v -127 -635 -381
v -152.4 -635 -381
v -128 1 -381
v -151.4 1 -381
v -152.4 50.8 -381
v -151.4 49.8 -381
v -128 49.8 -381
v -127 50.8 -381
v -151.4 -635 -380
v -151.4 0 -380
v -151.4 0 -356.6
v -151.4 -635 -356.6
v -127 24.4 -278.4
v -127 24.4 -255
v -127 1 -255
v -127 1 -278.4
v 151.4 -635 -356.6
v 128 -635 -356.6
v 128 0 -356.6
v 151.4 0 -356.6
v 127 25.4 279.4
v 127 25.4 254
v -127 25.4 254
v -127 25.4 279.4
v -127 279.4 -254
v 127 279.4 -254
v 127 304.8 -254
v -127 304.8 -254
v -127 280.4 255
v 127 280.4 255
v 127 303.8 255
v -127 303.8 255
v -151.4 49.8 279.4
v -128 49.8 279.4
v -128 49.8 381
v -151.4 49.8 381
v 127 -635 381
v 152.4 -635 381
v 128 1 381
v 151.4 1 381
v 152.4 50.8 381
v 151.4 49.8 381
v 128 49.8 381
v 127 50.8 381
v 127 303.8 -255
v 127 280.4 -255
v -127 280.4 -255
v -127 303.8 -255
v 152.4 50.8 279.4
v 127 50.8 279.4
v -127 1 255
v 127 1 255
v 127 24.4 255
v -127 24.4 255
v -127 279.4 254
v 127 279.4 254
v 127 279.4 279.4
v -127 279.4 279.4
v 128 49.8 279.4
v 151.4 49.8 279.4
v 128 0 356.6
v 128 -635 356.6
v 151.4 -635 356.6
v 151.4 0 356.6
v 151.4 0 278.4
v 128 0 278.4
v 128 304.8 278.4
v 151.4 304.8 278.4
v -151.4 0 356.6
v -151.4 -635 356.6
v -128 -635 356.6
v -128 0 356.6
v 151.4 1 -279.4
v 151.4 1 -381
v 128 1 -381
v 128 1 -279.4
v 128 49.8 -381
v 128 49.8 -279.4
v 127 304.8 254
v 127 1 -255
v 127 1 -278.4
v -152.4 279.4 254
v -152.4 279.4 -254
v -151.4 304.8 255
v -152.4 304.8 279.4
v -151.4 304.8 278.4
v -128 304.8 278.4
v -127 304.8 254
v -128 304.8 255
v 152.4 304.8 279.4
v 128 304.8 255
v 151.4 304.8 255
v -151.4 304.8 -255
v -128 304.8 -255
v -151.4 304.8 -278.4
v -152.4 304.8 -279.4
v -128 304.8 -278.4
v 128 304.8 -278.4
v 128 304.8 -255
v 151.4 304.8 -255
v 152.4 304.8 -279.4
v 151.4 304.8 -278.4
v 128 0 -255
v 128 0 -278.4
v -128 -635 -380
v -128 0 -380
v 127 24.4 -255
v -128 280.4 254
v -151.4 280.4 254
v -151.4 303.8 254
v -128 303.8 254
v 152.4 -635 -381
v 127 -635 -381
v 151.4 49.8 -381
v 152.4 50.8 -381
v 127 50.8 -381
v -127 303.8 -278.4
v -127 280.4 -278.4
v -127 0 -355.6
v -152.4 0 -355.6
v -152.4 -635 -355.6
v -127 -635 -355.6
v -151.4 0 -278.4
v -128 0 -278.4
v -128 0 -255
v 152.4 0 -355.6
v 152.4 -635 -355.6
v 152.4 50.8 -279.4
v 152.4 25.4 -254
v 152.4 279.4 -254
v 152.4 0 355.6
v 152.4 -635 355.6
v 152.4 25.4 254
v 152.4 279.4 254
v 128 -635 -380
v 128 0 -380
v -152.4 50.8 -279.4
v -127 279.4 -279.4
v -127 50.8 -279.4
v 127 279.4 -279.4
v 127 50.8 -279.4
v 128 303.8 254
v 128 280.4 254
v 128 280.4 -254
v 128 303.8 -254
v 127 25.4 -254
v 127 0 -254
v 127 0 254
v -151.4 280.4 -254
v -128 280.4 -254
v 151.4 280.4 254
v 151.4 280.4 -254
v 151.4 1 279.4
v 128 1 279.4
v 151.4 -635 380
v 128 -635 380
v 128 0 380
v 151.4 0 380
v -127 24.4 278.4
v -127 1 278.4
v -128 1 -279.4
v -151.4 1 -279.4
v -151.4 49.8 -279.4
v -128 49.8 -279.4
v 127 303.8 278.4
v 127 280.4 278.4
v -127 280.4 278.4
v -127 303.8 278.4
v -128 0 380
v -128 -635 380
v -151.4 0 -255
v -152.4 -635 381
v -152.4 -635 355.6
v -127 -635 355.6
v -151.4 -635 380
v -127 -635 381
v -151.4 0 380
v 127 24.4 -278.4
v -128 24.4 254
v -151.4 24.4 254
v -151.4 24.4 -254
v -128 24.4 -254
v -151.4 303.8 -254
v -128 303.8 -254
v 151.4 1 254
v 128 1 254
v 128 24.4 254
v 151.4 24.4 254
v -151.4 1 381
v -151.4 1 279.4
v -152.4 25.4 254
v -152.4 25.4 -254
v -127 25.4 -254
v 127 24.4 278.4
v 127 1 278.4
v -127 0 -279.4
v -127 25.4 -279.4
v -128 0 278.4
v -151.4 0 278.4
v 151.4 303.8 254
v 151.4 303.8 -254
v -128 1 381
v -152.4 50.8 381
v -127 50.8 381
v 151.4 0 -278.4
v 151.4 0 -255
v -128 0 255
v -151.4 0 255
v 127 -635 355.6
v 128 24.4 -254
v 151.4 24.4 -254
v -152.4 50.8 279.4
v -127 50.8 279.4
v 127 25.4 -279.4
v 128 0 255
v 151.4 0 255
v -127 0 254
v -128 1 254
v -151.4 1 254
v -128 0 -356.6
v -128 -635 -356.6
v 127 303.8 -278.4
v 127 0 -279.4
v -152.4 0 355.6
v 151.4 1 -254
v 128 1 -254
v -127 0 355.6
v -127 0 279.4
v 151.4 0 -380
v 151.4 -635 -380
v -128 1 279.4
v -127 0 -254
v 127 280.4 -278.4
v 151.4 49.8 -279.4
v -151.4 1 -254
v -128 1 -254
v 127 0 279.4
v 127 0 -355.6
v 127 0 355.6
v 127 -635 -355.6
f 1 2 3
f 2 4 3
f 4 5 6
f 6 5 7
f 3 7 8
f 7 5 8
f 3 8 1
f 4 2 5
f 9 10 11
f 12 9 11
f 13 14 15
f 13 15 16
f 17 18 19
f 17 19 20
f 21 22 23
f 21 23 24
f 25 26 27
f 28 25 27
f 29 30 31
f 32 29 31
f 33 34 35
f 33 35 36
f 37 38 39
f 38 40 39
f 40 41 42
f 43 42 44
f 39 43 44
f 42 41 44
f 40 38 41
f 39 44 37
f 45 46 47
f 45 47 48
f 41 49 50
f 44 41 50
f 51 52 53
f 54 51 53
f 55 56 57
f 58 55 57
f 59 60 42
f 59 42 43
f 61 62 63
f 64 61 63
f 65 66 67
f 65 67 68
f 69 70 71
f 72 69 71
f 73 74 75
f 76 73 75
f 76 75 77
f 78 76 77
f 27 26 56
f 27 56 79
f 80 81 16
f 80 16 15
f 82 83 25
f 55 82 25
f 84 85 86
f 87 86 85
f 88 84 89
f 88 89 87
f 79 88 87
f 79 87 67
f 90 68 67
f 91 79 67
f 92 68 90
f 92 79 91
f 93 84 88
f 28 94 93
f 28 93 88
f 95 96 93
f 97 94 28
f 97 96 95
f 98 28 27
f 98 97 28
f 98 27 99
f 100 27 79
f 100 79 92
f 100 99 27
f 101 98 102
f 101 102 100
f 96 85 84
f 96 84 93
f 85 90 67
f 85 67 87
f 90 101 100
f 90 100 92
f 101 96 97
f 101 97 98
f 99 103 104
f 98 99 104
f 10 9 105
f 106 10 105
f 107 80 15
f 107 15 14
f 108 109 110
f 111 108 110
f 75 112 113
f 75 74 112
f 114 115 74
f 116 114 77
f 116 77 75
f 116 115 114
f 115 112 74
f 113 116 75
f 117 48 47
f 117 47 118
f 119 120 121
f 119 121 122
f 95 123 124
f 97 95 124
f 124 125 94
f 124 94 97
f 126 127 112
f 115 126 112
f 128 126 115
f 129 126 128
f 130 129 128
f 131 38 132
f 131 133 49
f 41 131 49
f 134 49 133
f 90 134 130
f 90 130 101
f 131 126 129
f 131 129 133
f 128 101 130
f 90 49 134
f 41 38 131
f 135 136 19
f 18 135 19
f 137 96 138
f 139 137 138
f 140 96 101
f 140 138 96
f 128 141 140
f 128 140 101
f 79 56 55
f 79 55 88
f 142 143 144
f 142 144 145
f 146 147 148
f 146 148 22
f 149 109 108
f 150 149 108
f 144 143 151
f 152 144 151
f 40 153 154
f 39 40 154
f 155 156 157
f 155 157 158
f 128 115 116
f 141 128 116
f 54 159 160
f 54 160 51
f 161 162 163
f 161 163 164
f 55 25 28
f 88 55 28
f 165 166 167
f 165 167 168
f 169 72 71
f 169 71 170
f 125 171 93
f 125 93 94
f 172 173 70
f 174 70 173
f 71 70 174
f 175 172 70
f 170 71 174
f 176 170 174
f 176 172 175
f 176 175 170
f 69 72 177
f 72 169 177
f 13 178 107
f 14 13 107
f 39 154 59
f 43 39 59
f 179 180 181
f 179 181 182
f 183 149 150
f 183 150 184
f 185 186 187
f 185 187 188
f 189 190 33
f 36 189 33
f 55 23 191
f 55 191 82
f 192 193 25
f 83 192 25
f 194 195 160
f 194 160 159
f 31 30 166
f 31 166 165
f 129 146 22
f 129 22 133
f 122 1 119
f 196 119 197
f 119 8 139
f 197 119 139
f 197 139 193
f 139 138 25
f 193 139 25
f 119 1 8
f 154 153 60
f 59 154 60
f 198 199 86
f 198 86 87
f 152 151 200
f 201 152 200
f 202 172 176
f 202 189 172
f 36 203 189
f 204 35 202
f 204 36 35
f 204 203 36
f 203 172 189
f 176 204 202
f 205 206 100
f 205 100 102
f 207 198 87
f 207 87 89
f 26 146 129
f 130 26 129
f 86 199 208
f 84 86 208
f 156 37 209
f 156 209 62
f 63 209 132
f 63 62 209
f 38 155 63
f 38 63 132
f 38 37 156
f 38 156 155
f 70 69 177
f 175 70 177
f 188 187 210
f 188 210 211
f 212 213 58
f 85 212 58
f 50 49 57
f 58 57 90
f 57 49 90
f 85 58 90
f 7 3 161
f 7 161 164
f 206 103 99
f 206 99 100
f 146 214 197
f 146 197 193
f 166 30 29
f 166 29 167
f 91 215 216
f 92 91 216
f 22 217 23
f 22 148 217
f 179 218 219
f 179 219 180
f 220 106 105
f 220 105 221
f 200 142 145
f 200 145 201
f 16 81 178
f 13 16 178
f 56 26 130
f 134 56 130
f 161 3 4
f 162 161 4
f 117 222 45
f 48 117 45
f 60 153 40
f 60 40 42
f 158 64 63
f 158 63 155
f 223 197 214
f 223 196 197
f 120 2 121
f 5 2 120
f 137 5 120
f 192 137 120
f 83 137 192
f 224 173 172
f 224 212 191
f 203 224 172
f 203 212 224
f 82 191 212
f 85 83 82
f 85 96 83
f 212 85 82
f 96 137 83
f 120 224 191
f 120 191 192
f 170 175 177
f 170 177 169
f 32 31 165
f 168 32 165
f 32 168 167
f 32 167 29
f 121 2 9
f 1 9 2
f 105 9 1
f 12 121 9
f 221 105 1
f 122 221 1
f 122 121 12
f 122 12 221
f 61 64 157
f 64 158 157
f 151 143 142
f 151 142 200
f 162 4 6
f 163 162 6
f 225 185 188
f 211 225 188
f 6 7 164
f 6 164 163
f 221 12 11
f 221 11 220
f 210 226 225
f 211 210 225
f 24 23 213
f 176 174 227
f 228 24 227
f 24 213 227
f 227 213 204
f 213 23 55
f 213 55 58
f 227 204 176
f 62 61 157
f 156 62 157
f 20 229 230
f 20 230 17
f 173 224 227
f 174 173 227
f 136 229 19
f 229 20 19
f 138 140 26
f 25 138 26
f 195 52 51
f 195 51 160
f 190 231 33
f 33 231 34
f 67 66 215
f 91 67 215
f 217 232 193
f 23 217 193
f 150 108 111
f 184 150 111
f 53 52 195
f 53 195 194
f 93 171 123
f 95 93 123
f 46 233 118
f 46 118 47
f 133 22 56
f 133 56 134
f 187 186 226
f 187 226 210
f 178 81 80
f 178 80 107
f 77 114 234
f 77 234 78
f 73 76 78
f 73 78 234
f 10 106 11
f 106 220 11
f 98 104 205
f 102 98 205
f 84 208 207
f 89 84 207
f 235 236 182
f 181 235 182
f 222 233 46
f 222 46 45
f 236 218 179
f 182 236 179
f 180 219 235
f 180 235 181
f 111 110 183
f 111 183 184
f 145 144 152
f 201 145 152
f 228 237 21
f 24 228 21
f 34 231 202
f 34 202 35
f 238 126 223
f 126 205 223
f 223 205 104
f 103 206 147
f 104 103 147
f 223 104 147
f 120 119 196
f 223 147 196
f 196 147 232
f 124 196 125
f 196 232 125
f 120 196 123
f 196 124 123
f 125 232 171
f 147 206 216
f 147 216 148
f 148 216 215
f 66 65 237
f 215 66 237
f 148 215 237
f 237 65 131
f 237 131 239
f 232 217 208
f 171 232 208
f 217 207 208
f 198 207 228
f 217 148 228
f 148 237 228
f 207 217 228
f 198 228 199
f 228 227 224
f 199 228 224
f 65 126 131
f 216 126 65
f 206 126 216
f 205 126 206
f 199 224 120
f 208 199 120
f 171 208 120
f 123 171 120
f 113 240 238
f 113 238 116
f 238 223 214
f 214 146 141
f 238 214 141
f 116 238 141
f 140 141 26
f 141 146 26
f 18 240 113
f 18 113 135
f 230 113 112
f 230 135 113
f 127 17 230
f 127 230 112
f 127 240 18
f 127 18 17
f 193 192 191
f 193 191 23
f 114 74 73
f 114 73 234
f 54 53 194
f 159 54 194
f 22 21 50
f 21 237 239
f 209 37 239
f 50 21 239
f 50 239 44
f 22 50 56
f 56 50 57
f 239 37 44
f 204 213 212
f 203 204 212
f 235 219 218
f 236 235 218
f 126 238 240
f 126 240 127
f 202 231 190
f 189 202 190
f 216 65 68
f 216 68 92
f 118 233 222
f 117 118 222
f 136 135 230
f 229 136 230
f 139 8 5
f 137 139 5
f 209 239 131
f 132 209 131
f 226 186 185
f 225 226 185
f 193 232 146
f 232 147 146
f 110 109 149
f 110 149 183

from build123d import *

# Parameters (mm, degrees)
SKETCH1_W             = 25.4
SKETCH1_H             = 25.4
SKETCH1_W_2           = 23.4
SKETCH1_H_2           = 23.4
BOSS_EXTRUDE1_DEPTH   = 304.8
BOSS_EXTRUDE1_2_DEPTH = 304.8
BOSS_EXTRUDE1_3_DEPTH = 304.8
BOSS_EXTRUDE1_4_DEPTH = 304.8
SKETCH2_W             = 25.4
SKETCH2_H             = 25.4
SKETCH2_W_2           = 23.4
SKETCH2_H_2           = 23.4
BOSS_EXTRUDE2_DEPTH   = 508
SKETCH3_W             = 25.4
SKETCH3_H             = 25.4
SKETCH3_W_2           = 23.4
SKETCH3_H_2           = 23.4
BOSS_EXTRUDE4_DEPTH   = 254
LPATTERN2_COUNT       = 2
LPATTERN2_PITCH       = 279.4
SKETCH4_W             = 25.4
SKETCH4_H             = 50.8
SKETCH4_W_2           = 23.4
SKETCH4_H_2           = 48.8
BOSS_EXTRUDE5_DEPTH   = 101.6
SKETCH5_W             = 25.4
SKETCH5_H             = 25.4
SKETCH5_W_2           = 23.4
SKETCH5_H_2           = 23.4
BOSS_EXTRUDE6_DEPTH   = 635
LPATTERN3_COUNT       = 2
LPATTERN3_PITCH       = 660.4
LPATTERN4_COUNT       = 2
LPATTERN4_PITCH       = 736.6


with BuildPart() as part:
    # Sketch1 → Boss-Extrude1 (new body)
    with BuildSketch(Plane(origin=(0, 0, 0), x_dir=(1, 0, 0), z_dir=(0, 1, 0))):
        with Locations((139.7, 266.7)):
            Rectangle(SKETCH1_W, SKETCH1_H)
        with Locations((139.7, 266.7)):
            Rectangle(SKETCH1_W_2, SKETCH1_H_2, mode=Mode.SUBTRACT)
    extrude(amount=BOSS_EXTRUDE1_DEPTH)



with BuildPart() as body_2:
    # Sketch1 → Boss-Extrude1 2 (new body)
    with BuildSketch(Plane(origin=(0, 0, 0), x_dir=(1, 0, 0), z_dir=(0, 1, 0))):
        with Locations((139.7, -266.7)):
            Rectangle(SKETCH1_W, SKETCH1_H)
        with Locations((139.7, -266.7)):
            Rectangle(SKETCH1_W_2, SKETCH1_H_2, mode=Mode.SUBTRACT)
    extrude(amount=BOSS_EXTRUDE1_2_DEPTH)


with BuildPart() as body_3:
    # Sketch1 → Boss-Extrude1 3 (new body)
    with BuildSketch(Plane(origin=(0, 0, 0), x_dir=(1, 0, 0), z_dir=(0, 1, 0))):
        with Locations((-139.7, -266.7)):
            Rectangle(SKETCH1_W, SKETCH1_H)
        with Locations((-139.7, -266.7)):
            Rectangle(SKETCH1_W_2, SKETCH1_H_2, mode=Mode.SUBTRACT)
    extrude(amount=BOSS_EXTRUDE1_3_DEPTH)


with BuildPart() as body_4:
    # Sketch1 → Boss-Extrude1 4 (new body)
    with BuildSketch(Plane(origin=(0, 0, 0), x_dir=(1, 0, 0), z_dir=(0, 1, 0))):
        with Locations((-139.7, 266.7)):
            Rectangle(SKETCH1_W, SKETCH1_H)
        with Locations((-139.7, 266.7)):
            Rectangle(SKETCH1_W_2, SKETCH1_H_2, mode=Mode.SUBTRACT)
    extrude(amount=BOSS_EXTRUDE1_4_DEPTH)


with BuildPart() as part_1:
    add(part.part)

    add(body_2.part)  # Boss-Extrude2 merges body 2
    # Sketch2 → Boss-Extrude2 (add)
    # profile 1 of 2: a face of its own
    with BuildSketch(Plane.XY.offset(-254)):
        with Locations((139.7, 292.1)):
            Rectangle(SKETCH2_W, SKETCH2_H)
        with Locations((139.7, 292.1)):
            Rectangle(SKETCH2_W_2, SKETCH2_H_2, mode=Mode.SUBTRACT)
    # profile 2 of 2: a face of its own
    with BuildSketch(Plane.XY.offset(-254)):
        with Locations((139.7, 12.7)):
            Rectangle(SKETCH2_W, SKETCH2_H)
        with Locations((139.7, 12.7)):
            Rectangle(SKETCH2_W_2, SKETCH2_H_2, mode=Mode.SUBTRACT)
    boss_extrude2 = extrude(amount=BOSS_EXTRUDE2_DEPTH)


    add(body_3.part)  # Boss-Extrude4 merges body 3

    add(body_4.part)  # Boss-Extrude4 merges body 4
    # Sketch3 → Boss-Extrude4 (add)
    # profile 1 of 4: a face of its own
    with BuildSketch(Plane.ZY.offset(-127)):
        with Locations((266.7, 292.1)):
            Rectangle(SKETCH3_W, SKETCH3_H)
        with Locations((266.7, 292.1)):
            Rectangle(SKETCH3_W_2, SKETCH3_H_2, mode=Mode.SUBTRACT)
    # profile 2 of 4: a face of its own
    with BuildSketch(Plane.ZY.offset(-127)):
        with Locations((-266.7, 292.1)):
            Rectangle(SKETCH3_W, SKETCH3_H)
        with Locations((-266.7, 292.1)):
            Rectangle(SKETCH3_W_2, SKETCH3_H_2, mode=Mode.SUBTRACT)
    # profile 3 of 4: a face of its own
    with BuildSketch(Plane.ZY.offset(-127)):
        with Locations((266.7, 12.7)):
            Rectangle(SKETCH3_W, SKETCH3_H)
        with Locations((266.7, 12.7)):
            Rectangle(SKETCH3_W_2, SKETCH3_H_2, mode=Mode.SUBTRACT)
    # profile 4 of 4: a face of its own
    with BuildSketch(Plane.ZY.offset(-127)):
        with Locations((-266.7, 12.7)):
            Rectangle(SKETCH3_W, SKETCH3_H)
        with Locations((-266.7, 12.7)):
            Rectangle(SKETCH3_W_2, SKETCH3_H_2, mode=Mode.SUBTRACT)
    extrude(amount=BOSS_EXTRUDE4_DEPTH)

    # LPattern2: Boss-Extrude2 ×2
    with Locations(*[(-i * LPATTERN2_PITCH, 0, 0) for i in range(1, LPATTERN2_COUNT)]):
        add(boss_extrude2)

    # Sketch4 → Boss-Extrude5 (add)
    # profile 1 of 2: a face of its own
    with BuildSketch(Plane(origin=(0, 0, -279.4), x_dir=(-1, 0, 0), z_dir=(0, 0, -1))):
        with Locations((-139.7, 25.4)):
            Rectangle(SKETCH4_W, SKETCH4_H)
        with Locations((-139.7, 25.4)):
            Rectangle(SKETCH4_W_2, SKETCH4_H_2, mode=Mode.SUBTRACT)
    # profile 2 of 2: a face of its own
    with BuildSketch(Plane(origin=(0, 0, -279.4), x_dir=(-1, 0, 0), z_dir=(0, 0, -1))):
        with Locations((139.7, 25.4)):
            Rectangle(SKETCH4_W, SKETCH4_H)
        with Locations((139.7, 25.4)):
            Rectangle(SKETCH4_W_2, SKETCH4_H_2, mode=Mode.SUBTRACT)
    boss_extrude5 = extrude(amount=BOSS_EXTRUDE5_DEPTH)

    # Sketch5 → Boss-Extrude6 (add)
    # profile 1 of 2: a face of its own
    with BuildSketch(Plane.XZ):
        with Locations((-139.7, -368.3)):
            Rectangle(SKETCH5_W, SKETCH5_H)
        with Locations((-139.7, -368.3)):
            Rectangle(SKETCH5_W_2, SKETCH5_H_2, mode=Mode.SUBTRACT)
    # profile 2 of 2: a face of its own
    with BuildSketch(Plane.XZ):
        with Locations((139.7, -368.3)):
            Rectangle(SKETCH5_W, SKETCH5_H)
        with Locations((139.7, -368.3)):
            Rectangle(SKETCH5_W_2, SKETCH5_H_2, mode=Mode.SUBTRACT)
    boss_extrude6 = extrude(amount=BOSS_EXTRUDE6_DEPTH)

    # LPattern3: Boss-Extrude5 ×2
    with Locations(*[(0, 0, i * LPATTERN3_PITCH) for i in range(1, LPATTERN3_COUNT)]):
        add(boss_extrude5)

    # LPattern4: Boss-Extrude6 ×2
    with Locations(*[(0, 0, i * LPATTERN4_PITCH) for i in range(1, LPATTERN4_COUNT)]):
        add(boss_extrude6)


solid = part_1.part
